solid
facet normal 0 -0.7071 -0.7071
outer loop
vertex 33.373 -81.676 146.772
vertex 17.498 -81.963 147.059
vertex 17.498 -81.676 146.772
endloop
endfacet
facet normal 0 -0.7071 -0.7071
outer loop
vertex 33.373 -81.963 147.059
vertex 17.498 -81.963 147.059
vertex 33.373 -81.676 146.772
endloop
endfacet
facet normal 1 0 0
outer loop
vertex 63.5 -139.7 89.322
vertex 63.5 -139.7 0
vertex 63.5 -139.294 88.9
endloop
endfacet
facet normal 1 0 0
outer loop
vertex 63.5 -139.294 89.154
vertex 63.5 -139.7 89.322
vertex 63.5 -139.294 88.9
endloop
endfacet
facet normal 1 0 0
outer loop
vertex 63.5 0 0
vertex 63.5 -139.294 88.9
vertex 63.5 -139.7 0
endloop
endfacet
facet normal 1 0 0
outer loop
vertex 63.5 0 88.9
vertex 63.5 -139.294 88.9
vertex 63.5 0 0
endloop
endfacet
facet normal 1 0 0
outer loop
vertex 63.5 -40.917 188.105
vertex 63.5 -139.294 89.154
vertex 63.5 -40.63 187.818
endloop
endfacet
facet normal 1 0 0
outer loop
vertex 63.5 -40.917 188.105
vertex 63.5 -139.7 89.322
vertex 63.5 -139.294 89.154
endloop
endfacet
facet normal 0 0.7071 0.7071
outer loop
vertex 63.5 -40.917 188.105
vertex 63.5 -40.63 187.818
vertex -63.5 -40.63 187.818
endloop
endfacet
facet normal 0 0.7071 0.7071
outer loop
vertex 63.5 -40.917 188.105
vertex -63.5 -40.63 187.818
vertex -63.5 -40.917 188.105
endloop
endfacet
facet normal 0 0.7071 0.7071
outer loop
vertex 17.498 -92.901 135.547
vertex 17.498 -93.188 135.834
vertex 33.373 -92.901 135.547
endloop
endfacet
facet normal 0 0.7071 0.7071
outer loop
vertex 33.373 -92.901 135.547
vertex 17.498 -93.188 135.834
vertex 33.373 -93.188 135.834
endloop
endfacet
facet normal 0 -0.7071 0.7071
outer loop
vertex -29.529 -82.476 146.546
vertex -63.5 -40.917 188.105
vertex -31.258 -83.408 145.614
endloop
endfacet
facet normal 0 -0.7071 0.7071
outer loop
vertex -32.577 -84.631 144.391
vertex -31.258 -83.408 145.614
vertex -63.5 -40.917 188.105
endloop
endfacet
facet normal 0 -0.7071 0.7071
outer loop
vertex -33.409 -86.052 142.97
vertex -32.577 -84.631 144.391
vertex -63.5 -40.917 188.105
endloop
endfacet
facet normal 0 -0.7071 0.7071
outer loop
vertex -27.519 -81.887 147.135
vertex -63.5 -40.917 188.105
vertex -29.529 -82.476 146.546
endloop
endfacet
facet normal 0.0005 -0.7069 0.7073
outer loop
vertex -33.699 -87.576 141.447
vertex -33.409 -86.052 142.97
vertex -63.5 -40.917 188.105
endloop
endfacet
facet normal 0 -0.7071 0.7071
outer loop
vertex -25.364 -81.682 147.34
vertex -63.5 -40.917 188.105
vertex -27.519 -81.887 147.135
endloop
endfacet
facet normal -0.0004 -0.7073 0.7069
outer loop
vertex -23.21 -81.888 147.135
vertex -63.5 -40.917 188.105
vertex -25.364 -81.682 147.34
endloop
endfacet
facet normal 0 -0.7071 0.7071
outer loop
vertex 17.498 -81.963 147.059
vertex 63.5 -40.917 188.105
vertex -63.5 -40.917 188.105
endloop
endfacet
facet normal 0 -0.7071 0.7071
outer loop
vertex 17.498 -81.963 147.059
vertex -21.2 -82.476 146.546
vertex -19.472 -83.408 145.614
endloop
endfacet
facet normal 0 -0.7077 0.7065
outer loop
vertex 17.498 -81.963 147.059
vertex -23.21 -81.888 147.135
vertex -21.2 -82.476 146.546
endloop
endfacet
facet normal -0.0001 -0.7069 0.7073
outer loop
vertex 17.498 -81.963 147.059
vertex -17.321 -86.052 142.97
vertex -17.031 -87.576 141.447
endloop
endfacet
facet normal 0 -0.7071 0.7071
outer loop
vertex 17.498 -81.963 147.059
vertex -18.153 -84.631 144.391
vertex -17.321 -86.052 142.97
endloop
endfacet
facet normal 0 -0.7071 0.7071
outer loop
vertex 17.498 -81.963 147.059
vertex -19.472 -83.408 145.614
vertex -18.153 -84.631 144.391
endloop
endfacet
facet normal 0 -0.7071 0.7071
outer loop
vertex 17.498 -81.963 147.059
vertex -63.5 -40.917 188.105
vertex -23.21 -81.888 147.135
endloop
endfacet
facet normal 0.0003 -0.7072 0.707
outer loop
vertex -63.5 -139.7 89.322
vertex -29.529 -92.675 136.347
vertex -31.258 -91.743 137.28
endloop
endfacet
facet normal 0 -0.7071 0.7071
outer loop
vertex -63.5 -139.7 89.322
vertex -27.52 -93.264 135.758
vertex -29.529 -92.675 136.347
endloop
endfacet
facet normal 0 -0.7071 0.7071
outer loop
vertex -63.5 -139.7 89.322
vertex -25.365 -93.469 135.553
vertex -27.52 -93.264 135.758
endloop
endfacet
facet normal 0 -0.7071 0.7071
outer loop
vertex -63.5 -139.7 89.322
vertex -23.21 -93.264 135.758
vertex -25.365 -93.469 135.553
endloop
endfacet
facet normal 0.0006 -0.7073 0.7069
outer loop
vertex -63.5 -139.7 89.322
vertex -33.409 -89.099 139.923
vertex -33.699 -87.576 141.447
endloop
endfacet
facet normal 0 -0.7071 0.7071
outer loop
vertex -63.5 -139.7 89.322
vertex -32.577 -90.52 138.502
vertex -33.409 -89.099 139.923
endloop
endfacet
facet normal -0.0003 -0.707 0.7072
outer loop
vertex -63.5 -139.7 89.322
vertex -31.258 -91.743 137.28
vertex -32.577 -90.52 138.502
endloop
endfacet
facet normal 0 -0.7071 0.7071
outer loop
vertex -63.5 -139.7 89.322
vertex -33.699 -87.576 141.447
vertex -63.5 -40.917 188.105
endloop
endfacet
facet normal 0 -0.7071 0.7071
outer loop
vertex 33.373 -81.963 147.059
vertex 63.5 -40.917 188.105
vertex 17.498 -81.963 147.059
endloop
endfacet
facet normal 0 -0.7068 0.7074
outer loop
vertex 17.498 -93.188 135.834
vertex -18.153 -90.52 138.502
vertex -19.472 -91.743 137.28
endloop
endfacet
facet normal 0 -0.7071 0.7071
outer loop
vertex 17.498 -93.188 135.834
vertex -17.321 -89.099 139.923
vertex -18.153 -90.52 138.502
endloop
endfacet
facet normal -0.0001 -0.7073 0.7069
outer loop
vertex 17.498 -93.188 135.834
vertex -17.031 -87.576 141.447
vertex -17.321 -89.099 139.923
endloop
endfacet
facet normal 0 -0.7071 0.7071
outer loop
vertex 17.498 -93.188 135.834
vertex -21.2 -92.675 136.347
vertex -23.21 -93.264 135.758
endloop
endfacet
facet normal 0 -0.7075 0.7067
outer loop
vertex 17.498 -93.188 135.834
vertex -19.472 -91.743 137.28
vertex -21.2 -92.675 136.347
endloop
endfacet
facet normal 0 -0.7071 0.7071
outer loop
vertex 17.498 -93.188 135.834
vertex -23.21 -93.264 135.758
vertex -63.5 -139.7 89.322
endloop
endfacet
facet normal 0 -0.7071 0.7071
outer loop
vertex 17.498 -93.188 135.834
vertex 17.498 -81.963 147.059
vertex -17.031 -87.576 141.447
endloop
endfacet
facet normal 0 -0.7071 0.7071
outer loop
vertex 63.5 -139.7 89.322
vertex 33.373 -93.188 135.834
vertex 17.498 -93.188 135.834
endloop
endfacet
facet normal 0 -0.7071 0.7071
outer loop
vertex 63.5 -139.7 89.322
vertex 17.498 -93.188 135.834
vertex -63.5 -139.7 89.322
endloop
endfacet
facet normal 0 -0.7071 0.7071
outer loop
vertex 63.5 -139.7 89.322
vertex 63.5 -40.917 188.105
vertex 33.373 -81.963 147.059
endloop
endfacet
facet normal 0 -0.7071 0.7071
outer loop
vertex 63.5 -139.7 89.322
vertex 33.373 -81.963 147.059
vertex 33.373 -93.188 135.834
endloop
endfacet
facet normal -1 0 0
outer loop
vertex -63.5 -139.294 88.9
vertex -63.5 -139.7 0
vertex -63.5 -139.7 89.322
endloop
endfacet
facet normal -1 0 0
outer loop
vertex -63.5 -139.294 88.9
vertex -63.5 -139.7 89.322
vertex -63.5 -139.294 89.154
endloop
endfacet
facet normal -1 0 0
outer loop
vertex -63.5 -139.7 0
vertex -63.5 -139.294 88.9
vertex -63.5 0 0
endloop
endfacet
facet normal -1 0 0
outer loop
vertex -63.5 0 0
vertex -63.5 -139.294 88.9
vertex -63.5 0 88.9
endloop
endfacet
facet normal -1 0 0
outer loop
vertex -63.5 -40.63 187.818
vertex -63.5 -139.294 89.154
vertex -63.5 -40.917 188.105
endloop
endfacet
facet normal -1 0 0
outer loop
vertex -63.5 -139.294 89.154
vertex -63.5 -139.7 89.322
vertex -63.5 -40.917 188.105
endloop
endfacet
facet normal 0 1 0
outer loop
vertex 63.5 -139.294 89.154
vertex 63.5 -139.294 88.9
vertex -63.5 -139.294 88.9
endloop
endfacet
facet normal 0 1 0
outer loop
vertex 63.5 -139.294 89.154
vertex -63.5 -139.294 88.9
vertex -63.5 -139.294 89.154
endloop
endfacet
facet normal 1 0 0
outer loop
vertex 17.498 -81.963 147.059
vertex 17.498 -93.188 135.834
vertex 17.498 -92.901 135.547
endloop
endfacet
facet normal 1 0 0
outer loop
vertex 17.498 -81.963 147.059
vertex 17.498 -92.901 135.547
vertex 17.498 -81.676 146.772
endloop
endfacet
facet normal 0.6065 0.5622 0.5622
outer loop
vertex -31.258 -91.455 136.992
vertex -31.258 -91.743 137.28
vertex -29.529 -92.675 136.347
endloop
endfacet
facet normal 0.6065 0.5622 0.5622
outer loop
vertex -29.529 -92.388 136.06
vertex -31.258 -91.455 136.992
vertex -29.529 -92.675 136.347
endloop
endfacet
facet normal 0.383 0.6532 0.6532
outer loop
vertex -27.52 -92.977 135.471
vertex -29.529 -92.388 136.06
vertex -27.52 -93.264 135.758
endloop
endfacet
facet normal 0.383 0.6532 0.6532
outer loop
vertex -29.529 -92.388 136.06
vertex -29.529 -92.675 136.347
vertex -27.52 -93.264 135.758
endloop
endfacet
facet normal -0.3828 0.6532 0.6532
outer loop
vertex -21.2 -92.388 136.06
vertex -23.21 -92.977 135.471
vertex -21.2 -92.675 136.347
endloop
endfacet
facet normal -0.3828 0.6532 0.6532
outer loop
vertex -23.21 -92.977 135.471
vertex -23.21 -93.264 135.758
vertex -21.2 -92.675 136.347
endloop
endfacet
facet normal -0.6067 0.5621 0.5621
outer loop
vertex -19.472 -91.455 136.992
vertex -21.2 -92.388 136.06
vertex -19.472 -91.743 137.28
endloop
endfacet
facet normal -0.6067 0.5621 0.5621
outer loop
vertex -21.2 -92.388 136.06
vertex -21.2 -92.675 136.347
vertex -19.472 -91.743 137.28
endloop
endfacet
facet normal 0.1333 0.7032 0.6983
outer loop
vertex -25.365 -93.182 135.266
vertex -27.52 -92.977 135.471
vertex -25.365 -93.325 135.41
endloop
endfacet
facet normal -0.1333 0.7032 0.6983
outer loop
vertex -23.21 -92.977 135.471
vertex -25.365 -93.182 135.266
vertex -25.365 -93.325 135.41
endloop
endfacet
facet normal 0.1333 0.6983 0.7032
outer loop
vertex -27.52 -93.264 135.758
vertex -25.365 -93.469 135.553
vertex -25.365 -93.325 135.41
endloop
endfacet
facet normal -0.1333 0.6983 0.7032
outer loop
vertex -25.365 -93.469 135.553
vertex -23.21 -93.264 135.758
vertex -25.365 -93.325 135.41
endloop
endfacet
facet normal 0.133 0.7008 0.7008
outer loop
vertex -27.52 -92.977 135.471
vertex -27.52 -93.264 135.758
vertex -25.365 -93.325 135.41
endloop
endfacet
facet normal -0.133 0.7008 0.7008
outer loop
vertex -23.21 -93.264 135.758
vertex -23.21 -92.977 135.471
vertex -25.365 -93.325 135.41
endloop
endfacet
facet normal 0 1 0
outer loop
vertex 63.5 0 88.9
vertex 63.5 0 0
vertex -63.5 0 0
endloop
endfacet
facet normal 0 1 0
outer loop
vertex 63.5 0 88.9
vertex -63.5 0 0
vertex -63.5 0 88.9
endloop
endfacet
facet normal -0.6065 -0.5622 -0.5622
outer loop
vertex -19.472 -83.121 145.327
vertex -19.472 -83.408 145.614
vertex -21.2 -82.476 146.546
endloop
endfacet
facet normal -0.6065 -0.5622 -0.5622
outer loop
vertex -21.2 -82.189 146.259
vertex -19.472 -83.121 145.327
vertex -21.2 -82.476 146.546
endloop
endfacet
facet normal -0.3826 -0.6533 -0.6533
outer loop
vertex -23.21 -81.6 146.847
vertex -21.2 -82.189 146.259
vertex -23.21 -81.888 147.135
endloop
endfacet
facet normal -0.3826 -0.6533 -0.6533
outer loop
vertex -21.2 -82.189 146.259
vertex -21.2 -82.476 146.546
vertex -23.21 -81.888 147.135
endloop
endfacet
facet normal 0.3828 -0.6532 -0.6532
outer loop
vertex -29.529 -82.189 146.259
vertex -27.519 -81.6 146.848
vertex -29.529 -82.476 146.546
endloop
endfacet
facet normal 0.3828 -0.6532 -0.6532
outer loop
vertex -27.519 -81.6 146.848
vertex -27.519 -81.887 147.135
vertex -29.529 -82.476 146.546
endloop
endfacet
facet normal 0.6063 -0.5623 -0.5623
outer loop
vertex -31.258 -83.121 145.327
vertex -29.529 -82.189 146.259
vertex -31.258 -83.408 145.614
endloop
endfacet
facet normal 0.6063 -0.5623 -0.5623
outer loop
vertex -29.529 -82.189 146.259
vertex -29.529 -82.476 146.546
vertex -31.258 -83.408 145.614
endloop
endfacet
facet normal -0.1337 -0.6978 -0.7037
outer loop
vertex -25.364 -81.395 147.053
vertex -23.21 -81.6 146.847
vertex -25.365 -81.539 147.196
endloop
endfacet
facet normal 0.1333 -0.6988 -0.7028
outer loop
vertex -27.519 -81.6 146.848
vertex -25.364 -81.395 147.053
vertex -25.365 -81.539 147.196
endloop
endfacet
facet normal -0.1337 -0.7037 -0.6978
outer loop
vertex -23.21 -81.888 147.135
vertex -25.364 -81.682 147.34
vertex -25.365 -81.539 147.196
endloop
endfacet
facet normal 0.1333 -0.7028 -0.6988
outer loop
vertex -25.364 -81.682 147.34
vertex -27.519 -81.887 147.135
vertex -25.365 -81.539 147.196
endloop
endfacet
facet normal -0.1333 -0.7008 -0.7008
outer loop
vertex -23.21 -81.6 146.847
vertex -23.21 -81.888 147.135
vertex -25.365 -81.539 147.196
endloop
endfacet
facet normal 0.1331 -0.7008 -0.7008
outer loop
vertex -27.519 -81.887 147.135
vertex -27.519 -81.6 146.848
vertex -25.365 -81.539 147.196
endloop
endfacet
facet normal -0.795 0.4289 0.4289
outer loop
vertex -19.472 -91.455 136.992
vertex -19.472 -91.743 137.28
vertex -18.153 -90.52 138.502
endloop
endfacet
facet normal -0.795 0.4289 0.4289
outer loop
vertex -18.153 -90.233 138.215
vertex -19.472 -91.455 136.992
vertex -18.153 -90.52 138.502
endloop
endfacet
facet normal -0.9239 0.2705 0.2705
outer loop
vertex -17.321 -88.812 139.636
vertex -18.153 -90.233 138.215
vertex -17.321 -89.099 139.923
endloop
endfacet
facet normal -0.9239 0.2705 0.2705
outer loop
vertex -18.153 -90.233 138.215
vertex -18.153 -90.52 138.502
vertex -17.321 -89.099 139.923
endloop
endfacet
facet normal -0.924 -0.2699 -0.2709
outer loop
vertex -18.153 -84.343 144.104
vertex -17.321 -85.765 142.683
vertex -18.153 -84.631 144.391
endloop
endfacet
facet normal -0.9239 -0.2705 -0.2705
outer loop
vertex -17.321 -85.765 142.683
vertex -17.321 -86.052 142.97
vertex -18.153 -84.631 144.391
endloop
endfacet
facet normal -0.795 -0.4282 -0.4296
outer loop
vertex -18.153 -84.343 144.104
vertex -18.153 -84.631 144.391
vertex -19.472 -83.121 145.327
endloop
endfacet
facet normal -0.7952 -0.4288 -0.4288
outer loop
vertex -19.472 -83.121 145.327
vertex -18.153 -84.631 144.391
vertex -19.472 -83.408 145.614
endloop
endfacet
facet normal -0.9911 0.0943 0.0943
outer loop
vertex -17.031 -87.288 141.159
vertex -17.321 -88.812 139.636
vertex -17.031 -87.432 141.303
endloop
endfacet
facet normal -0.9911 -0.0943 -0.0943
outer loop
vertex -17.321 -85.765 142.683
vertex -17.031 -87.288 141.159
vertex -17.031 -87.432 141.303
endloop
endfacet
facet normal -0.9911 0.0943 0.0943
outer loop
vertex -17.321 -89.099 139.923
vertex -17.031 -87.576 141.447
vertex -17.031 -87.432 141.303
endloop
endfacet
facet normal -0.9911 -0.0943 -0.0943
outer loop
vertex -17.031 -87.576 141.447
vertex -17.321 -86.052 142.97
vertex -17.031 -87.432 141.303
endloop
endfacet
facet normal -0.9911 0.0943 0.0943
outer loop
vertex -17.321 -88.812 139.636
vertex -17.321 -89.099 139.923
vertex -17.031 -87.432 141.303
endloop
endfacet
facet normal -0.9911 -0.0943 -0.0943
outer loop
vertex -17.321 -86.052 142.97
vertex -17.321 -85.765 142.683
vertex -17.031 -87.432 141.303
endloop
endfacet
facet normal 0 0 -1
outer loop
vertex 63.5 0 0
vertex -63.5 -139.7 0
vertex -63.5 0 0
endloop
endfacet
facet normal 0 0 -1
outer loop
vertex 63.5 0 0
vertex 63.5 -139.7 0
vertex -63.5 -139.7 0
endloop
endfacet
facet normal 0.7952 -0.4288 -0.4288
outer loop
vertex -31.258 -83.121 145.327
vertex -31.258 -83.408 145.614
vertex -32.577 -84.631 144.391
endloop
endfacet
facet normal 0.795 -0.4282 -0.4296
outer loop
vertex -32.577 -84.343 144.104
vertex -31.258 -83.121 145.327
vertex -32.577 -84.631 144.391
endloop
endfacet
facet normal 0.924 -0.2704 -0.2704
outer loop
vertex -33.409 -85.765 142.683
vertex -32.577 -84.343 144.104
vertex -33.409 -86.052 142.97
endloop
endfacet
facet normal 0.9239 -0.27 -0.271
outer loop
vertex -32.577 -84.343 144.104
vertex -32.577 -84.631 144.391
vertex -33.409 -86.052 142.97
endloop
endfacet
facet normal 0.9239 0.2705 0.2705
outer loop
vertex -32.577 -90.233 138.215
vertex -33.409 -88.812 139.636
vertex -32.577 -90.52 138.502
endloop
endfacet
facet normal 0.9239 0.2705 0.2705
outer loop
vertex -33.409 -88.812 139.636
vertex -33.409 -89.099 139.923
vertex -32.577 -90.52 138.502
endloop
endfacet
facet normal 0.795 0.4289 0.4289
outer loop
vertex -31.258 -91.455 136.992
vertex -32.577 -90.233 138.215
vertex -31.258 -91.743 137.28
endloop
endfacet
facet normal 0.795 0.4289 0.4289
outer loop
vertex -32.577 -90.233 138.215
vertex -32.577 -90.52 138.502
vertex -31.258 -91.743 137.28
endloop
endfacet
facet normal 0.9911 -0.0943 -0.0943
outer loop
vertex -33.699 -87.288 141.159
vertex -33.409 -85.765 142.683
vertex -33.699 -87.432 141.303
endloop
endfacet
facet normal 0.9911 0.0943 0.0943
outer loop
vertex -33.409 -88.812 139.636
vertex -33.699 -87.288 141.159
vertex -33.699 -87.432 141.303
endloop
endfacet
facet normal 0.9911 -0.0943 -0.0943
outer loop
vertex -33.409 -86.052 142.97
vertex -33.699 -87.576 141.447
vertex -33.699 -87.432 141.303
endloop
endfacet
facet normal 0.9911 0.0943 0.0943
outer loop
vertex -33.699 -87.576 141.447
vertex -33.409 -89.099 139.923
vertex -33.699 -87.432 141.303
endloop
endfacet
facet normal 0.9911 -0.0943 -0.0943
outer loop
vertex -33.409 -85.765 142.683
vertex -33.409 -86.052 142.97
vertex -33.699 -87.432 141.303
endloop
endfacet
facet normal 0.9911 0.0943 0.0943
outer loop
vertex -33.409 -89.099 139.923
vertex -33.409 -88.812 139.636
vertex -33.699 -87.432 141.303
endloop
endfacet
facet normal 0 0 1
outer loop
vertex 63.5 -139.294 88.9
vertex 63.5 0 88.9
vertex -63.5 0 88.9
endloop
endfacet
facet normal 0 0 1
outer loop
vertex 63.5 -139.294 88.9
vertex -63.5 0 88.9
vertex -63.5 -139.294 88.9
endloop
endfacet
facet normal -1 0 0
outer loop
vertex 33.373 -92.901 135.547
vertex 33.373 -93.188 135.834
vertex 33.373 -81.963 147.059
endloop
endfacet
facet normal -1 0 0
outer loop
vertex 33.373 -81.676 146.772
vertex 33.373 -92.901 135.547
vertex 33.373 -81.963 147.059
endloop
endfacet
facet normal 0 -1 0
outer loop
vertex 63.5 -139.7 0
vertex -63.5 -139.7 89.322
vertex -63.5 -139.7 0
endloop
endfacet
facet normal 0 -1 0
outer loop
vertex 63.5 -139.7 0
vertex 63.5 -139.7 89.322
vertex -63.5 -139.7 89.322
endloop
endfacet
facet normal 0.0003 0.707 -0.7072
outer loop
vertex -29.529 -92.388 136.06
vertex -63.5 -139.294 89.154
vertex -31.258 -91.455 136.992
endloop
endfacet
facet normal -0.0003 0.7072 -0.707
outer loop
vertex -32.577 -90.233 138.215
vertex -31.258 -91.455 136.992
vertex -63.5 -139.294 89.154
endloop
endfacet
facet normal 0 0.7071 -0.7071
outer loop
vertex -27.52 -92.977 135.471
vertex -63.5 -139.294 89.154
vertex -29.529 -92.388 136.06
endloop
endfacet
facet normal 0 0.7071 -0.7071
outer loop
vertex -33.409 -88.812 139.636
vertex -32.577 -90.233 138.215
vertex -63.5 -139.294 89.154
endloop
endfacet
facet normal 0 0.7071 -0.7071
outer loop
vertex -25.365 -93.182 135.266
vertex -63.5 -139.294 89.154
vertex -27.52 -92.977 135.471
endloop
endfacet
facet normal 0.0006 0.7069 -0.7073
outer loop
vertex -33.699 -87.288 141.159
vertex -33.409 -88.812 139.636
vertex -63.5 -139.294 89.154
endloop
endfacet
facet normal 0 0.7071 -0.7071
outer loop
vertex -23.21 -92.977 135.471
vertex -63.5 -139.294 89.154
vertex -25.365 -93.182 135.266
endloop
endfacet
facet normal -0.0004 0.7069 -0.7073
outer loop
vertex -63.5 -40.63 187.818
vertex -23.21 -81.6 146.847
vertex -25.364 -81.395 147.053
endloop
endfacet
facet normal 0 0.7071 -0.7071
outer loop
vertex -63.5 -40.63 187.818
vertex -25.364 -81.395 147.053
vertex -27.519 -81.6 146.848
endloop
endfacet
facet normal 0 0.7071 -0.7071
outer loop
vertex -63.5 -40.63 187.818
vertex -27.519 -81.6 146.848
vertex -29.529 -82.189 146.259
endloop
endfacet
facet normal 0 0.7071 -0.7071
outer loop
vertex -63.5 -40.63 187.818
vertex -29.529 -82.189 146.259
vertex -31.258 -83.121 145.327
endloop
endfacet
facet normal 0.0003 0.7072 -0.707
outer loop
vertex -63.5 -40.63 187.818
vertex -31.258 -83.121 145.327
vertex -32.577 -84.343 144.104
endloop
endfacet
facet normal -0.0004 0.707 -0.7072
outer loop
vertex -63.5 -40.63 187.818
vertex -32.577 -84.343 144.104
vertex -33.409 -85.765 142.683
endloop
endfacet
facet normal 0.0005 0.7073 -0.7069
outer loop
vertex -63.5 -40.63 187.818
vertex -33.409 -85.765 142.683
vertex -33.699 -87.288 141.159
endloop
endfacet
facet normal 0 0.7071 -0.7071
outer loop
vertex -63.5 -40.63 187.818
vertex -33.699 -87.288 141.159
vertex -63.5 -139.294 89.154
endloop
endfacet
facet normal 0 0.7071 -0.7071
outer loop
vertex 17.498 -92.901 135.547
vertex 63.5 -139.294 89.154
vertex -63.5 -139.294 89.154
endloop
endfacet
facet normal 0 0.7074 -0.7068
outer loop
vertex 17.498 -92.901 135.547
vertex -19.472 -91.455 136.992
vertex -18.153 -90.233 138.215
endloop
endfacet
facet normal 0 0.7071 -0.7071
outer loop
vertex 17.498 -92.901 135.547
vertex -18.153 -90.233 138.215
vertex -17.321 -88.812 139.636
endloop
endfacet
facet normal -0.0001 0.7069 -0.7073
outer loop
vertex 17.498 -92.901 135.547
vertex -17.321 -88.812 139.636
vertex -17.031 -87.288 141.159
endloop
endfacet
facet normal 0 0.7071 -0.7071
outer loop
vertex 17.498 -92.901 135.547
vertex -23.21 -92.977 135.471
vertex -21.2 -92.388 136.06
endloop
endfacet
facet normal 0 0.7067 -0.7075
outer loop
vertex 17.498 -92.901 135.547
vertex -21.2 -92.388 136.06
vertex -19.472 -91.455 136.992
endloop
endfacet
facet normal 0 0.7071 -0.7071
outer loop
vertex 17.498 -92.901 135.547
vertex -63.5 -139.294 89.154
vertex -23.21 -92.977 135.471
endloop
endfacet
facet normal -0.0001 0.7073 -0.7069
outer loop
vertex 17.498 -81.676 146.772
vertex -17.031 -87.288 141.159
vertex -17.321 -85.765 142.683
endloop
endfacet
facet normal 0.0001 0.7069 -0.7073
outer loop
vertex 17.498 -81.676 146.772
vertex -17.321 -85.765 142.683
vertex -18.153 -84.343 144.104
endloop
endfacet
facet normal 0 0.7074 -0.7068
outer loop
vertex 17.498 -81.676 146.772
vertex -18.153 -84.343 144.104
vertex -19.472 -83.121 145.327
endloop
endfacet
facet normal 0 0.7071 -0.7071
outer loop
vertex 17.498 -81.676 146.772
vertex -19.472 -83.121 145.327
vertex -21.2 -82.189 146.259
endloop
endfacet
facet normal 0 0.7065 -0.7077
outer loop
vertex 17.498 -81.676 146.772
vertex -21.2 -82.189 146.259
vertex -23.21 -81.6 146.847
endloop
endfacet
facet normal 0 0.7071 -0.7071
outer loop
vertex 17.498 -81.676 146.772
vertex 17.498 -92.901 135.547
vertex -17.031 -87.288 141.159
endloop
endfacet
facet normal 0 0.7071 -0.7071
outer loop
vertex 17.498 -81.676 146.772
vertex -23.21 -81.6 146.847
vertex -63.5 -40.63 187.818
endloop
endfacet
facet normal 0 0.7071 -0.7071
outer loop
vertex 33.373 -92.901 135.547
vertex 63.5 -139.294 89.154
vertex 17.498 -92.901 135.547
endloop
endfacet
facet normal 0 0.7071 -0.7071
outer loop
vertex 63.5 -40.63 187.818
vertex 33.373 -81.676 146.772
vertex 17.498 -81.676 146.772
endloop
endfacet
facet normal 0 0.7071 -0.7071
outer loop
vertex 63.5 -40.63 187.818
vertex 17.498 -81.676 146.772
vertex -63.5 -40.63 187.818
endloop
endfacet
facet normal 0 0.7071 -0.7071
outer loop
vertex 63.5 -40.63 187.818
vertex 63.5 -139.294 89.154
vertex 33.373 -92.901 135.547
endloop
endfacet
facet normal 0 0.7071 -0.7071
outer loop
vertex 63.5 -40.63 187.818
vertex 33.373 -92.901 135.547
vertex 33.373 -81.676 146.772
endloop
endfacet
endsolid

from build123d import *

# Parameters (mm, degrees)
F1_DEPTH = 63.5
F2_W     = 15.875
F2_H     = 15.875
F3_DEPTH = 0.4064


# Not quite as in the source:
# - the dataset's text gives a spline's control points without its knots; the knots are read off the source's solid


with BuildPart() as f1:
    # F0 (on Right) → F1 (new body, symmetric)
    with BuildSketch(Plane.YZ):
        Polygon((-139.7, 0), (0, 0), (0, 88.9), (-139.2936, 88.9), (-139.2936, 89.154), (-40.6298144724, 187.8177855276), (-40.9171826682, 188.1051537235), (-139.7, 89.3223363917), align=None)
    extrude(amount=F1_DEPTH, both=True)

    # F2 (on face) → F3 (cut, through all)
    with BuildSketch(Plane(origin=(0, -114.5111681959, 114.5111681959), x_dir=(1, 0, 0), z_dir=(0, -0.7071067812, 0.7071067812))):
        with Locations((25.435084784, 38.0925593219)):
            Rectangle(F2_W, F2_H)
        with BuildLine():
            add(Edge.make_bspline(
                [(-19.471708816, 43.9859181219), (-21.014403216, 45.5287903219), (-23.182750416, 46.4269343219), (-25.364915216, 46.4269343219)],
                knots=[7, 7, 7, 7, 8, 8, 8, 8], degree=3))
            add(Edge.make_bspline(
                [(-25.364915216, 46.4269343219), (-27.546648216, 46.4269343219), (-29.715351016, 45.5287903219), (-31.258045416, 43.9859181219)],
                knots=[0, 0, 0, 0, 1, 1, 1, 1], degree=3))
            add(Edge.make_bspline(
                [(-31.258045416, 43.9859181219), (-32.800790616, 42.4430205219), (-33.699290216, 40.2745209219), (-33.699290216, 38.0925593219), (-33.699290216, 35.9107755219), (-32.800790616, 33.7420981219), (-31.258045416, 32.1993529219)],
                knots=[1, 1, 1, 1, 2, 2, 2, 3, 3, 3, 3], degree=3))
            add(Edge.make_bspline(
                [(-31.258045416, 32.1993529219), (-29.715351016, 30.6563029219), (-27.546648216, 29.7581843219), (-25.364915216, 29.7581843219), (-23.182750416, 29.7581843219), (-21.014403216, 30.6563029219), (-19.471708816, 32.1993529219)],
                knots=[3, 3, 3, 3, 4, 4, 4, 5, 5, 5, 5], degree=3))
            add(Edge.make_bspline(
                [(-19.471708816, 32.1993529219), (-17.928658816, 33.7420981219), (-17.030540216, 35.9107755219), (-17.030540216, 38.0925593219), (-17.030540216, 40.2745209219), (-17.928658816, 42.4430205219), (-19.471708816, 43.9859181219)],
                knots=[5, 5, 5, 5, 6, 6, 6, 7, 7, 7, 7], degree=3))
        make_face()
    extrude(amount=-F3_DEPTH, mode=Mode.SUBTRACT)


solid = f1.part
